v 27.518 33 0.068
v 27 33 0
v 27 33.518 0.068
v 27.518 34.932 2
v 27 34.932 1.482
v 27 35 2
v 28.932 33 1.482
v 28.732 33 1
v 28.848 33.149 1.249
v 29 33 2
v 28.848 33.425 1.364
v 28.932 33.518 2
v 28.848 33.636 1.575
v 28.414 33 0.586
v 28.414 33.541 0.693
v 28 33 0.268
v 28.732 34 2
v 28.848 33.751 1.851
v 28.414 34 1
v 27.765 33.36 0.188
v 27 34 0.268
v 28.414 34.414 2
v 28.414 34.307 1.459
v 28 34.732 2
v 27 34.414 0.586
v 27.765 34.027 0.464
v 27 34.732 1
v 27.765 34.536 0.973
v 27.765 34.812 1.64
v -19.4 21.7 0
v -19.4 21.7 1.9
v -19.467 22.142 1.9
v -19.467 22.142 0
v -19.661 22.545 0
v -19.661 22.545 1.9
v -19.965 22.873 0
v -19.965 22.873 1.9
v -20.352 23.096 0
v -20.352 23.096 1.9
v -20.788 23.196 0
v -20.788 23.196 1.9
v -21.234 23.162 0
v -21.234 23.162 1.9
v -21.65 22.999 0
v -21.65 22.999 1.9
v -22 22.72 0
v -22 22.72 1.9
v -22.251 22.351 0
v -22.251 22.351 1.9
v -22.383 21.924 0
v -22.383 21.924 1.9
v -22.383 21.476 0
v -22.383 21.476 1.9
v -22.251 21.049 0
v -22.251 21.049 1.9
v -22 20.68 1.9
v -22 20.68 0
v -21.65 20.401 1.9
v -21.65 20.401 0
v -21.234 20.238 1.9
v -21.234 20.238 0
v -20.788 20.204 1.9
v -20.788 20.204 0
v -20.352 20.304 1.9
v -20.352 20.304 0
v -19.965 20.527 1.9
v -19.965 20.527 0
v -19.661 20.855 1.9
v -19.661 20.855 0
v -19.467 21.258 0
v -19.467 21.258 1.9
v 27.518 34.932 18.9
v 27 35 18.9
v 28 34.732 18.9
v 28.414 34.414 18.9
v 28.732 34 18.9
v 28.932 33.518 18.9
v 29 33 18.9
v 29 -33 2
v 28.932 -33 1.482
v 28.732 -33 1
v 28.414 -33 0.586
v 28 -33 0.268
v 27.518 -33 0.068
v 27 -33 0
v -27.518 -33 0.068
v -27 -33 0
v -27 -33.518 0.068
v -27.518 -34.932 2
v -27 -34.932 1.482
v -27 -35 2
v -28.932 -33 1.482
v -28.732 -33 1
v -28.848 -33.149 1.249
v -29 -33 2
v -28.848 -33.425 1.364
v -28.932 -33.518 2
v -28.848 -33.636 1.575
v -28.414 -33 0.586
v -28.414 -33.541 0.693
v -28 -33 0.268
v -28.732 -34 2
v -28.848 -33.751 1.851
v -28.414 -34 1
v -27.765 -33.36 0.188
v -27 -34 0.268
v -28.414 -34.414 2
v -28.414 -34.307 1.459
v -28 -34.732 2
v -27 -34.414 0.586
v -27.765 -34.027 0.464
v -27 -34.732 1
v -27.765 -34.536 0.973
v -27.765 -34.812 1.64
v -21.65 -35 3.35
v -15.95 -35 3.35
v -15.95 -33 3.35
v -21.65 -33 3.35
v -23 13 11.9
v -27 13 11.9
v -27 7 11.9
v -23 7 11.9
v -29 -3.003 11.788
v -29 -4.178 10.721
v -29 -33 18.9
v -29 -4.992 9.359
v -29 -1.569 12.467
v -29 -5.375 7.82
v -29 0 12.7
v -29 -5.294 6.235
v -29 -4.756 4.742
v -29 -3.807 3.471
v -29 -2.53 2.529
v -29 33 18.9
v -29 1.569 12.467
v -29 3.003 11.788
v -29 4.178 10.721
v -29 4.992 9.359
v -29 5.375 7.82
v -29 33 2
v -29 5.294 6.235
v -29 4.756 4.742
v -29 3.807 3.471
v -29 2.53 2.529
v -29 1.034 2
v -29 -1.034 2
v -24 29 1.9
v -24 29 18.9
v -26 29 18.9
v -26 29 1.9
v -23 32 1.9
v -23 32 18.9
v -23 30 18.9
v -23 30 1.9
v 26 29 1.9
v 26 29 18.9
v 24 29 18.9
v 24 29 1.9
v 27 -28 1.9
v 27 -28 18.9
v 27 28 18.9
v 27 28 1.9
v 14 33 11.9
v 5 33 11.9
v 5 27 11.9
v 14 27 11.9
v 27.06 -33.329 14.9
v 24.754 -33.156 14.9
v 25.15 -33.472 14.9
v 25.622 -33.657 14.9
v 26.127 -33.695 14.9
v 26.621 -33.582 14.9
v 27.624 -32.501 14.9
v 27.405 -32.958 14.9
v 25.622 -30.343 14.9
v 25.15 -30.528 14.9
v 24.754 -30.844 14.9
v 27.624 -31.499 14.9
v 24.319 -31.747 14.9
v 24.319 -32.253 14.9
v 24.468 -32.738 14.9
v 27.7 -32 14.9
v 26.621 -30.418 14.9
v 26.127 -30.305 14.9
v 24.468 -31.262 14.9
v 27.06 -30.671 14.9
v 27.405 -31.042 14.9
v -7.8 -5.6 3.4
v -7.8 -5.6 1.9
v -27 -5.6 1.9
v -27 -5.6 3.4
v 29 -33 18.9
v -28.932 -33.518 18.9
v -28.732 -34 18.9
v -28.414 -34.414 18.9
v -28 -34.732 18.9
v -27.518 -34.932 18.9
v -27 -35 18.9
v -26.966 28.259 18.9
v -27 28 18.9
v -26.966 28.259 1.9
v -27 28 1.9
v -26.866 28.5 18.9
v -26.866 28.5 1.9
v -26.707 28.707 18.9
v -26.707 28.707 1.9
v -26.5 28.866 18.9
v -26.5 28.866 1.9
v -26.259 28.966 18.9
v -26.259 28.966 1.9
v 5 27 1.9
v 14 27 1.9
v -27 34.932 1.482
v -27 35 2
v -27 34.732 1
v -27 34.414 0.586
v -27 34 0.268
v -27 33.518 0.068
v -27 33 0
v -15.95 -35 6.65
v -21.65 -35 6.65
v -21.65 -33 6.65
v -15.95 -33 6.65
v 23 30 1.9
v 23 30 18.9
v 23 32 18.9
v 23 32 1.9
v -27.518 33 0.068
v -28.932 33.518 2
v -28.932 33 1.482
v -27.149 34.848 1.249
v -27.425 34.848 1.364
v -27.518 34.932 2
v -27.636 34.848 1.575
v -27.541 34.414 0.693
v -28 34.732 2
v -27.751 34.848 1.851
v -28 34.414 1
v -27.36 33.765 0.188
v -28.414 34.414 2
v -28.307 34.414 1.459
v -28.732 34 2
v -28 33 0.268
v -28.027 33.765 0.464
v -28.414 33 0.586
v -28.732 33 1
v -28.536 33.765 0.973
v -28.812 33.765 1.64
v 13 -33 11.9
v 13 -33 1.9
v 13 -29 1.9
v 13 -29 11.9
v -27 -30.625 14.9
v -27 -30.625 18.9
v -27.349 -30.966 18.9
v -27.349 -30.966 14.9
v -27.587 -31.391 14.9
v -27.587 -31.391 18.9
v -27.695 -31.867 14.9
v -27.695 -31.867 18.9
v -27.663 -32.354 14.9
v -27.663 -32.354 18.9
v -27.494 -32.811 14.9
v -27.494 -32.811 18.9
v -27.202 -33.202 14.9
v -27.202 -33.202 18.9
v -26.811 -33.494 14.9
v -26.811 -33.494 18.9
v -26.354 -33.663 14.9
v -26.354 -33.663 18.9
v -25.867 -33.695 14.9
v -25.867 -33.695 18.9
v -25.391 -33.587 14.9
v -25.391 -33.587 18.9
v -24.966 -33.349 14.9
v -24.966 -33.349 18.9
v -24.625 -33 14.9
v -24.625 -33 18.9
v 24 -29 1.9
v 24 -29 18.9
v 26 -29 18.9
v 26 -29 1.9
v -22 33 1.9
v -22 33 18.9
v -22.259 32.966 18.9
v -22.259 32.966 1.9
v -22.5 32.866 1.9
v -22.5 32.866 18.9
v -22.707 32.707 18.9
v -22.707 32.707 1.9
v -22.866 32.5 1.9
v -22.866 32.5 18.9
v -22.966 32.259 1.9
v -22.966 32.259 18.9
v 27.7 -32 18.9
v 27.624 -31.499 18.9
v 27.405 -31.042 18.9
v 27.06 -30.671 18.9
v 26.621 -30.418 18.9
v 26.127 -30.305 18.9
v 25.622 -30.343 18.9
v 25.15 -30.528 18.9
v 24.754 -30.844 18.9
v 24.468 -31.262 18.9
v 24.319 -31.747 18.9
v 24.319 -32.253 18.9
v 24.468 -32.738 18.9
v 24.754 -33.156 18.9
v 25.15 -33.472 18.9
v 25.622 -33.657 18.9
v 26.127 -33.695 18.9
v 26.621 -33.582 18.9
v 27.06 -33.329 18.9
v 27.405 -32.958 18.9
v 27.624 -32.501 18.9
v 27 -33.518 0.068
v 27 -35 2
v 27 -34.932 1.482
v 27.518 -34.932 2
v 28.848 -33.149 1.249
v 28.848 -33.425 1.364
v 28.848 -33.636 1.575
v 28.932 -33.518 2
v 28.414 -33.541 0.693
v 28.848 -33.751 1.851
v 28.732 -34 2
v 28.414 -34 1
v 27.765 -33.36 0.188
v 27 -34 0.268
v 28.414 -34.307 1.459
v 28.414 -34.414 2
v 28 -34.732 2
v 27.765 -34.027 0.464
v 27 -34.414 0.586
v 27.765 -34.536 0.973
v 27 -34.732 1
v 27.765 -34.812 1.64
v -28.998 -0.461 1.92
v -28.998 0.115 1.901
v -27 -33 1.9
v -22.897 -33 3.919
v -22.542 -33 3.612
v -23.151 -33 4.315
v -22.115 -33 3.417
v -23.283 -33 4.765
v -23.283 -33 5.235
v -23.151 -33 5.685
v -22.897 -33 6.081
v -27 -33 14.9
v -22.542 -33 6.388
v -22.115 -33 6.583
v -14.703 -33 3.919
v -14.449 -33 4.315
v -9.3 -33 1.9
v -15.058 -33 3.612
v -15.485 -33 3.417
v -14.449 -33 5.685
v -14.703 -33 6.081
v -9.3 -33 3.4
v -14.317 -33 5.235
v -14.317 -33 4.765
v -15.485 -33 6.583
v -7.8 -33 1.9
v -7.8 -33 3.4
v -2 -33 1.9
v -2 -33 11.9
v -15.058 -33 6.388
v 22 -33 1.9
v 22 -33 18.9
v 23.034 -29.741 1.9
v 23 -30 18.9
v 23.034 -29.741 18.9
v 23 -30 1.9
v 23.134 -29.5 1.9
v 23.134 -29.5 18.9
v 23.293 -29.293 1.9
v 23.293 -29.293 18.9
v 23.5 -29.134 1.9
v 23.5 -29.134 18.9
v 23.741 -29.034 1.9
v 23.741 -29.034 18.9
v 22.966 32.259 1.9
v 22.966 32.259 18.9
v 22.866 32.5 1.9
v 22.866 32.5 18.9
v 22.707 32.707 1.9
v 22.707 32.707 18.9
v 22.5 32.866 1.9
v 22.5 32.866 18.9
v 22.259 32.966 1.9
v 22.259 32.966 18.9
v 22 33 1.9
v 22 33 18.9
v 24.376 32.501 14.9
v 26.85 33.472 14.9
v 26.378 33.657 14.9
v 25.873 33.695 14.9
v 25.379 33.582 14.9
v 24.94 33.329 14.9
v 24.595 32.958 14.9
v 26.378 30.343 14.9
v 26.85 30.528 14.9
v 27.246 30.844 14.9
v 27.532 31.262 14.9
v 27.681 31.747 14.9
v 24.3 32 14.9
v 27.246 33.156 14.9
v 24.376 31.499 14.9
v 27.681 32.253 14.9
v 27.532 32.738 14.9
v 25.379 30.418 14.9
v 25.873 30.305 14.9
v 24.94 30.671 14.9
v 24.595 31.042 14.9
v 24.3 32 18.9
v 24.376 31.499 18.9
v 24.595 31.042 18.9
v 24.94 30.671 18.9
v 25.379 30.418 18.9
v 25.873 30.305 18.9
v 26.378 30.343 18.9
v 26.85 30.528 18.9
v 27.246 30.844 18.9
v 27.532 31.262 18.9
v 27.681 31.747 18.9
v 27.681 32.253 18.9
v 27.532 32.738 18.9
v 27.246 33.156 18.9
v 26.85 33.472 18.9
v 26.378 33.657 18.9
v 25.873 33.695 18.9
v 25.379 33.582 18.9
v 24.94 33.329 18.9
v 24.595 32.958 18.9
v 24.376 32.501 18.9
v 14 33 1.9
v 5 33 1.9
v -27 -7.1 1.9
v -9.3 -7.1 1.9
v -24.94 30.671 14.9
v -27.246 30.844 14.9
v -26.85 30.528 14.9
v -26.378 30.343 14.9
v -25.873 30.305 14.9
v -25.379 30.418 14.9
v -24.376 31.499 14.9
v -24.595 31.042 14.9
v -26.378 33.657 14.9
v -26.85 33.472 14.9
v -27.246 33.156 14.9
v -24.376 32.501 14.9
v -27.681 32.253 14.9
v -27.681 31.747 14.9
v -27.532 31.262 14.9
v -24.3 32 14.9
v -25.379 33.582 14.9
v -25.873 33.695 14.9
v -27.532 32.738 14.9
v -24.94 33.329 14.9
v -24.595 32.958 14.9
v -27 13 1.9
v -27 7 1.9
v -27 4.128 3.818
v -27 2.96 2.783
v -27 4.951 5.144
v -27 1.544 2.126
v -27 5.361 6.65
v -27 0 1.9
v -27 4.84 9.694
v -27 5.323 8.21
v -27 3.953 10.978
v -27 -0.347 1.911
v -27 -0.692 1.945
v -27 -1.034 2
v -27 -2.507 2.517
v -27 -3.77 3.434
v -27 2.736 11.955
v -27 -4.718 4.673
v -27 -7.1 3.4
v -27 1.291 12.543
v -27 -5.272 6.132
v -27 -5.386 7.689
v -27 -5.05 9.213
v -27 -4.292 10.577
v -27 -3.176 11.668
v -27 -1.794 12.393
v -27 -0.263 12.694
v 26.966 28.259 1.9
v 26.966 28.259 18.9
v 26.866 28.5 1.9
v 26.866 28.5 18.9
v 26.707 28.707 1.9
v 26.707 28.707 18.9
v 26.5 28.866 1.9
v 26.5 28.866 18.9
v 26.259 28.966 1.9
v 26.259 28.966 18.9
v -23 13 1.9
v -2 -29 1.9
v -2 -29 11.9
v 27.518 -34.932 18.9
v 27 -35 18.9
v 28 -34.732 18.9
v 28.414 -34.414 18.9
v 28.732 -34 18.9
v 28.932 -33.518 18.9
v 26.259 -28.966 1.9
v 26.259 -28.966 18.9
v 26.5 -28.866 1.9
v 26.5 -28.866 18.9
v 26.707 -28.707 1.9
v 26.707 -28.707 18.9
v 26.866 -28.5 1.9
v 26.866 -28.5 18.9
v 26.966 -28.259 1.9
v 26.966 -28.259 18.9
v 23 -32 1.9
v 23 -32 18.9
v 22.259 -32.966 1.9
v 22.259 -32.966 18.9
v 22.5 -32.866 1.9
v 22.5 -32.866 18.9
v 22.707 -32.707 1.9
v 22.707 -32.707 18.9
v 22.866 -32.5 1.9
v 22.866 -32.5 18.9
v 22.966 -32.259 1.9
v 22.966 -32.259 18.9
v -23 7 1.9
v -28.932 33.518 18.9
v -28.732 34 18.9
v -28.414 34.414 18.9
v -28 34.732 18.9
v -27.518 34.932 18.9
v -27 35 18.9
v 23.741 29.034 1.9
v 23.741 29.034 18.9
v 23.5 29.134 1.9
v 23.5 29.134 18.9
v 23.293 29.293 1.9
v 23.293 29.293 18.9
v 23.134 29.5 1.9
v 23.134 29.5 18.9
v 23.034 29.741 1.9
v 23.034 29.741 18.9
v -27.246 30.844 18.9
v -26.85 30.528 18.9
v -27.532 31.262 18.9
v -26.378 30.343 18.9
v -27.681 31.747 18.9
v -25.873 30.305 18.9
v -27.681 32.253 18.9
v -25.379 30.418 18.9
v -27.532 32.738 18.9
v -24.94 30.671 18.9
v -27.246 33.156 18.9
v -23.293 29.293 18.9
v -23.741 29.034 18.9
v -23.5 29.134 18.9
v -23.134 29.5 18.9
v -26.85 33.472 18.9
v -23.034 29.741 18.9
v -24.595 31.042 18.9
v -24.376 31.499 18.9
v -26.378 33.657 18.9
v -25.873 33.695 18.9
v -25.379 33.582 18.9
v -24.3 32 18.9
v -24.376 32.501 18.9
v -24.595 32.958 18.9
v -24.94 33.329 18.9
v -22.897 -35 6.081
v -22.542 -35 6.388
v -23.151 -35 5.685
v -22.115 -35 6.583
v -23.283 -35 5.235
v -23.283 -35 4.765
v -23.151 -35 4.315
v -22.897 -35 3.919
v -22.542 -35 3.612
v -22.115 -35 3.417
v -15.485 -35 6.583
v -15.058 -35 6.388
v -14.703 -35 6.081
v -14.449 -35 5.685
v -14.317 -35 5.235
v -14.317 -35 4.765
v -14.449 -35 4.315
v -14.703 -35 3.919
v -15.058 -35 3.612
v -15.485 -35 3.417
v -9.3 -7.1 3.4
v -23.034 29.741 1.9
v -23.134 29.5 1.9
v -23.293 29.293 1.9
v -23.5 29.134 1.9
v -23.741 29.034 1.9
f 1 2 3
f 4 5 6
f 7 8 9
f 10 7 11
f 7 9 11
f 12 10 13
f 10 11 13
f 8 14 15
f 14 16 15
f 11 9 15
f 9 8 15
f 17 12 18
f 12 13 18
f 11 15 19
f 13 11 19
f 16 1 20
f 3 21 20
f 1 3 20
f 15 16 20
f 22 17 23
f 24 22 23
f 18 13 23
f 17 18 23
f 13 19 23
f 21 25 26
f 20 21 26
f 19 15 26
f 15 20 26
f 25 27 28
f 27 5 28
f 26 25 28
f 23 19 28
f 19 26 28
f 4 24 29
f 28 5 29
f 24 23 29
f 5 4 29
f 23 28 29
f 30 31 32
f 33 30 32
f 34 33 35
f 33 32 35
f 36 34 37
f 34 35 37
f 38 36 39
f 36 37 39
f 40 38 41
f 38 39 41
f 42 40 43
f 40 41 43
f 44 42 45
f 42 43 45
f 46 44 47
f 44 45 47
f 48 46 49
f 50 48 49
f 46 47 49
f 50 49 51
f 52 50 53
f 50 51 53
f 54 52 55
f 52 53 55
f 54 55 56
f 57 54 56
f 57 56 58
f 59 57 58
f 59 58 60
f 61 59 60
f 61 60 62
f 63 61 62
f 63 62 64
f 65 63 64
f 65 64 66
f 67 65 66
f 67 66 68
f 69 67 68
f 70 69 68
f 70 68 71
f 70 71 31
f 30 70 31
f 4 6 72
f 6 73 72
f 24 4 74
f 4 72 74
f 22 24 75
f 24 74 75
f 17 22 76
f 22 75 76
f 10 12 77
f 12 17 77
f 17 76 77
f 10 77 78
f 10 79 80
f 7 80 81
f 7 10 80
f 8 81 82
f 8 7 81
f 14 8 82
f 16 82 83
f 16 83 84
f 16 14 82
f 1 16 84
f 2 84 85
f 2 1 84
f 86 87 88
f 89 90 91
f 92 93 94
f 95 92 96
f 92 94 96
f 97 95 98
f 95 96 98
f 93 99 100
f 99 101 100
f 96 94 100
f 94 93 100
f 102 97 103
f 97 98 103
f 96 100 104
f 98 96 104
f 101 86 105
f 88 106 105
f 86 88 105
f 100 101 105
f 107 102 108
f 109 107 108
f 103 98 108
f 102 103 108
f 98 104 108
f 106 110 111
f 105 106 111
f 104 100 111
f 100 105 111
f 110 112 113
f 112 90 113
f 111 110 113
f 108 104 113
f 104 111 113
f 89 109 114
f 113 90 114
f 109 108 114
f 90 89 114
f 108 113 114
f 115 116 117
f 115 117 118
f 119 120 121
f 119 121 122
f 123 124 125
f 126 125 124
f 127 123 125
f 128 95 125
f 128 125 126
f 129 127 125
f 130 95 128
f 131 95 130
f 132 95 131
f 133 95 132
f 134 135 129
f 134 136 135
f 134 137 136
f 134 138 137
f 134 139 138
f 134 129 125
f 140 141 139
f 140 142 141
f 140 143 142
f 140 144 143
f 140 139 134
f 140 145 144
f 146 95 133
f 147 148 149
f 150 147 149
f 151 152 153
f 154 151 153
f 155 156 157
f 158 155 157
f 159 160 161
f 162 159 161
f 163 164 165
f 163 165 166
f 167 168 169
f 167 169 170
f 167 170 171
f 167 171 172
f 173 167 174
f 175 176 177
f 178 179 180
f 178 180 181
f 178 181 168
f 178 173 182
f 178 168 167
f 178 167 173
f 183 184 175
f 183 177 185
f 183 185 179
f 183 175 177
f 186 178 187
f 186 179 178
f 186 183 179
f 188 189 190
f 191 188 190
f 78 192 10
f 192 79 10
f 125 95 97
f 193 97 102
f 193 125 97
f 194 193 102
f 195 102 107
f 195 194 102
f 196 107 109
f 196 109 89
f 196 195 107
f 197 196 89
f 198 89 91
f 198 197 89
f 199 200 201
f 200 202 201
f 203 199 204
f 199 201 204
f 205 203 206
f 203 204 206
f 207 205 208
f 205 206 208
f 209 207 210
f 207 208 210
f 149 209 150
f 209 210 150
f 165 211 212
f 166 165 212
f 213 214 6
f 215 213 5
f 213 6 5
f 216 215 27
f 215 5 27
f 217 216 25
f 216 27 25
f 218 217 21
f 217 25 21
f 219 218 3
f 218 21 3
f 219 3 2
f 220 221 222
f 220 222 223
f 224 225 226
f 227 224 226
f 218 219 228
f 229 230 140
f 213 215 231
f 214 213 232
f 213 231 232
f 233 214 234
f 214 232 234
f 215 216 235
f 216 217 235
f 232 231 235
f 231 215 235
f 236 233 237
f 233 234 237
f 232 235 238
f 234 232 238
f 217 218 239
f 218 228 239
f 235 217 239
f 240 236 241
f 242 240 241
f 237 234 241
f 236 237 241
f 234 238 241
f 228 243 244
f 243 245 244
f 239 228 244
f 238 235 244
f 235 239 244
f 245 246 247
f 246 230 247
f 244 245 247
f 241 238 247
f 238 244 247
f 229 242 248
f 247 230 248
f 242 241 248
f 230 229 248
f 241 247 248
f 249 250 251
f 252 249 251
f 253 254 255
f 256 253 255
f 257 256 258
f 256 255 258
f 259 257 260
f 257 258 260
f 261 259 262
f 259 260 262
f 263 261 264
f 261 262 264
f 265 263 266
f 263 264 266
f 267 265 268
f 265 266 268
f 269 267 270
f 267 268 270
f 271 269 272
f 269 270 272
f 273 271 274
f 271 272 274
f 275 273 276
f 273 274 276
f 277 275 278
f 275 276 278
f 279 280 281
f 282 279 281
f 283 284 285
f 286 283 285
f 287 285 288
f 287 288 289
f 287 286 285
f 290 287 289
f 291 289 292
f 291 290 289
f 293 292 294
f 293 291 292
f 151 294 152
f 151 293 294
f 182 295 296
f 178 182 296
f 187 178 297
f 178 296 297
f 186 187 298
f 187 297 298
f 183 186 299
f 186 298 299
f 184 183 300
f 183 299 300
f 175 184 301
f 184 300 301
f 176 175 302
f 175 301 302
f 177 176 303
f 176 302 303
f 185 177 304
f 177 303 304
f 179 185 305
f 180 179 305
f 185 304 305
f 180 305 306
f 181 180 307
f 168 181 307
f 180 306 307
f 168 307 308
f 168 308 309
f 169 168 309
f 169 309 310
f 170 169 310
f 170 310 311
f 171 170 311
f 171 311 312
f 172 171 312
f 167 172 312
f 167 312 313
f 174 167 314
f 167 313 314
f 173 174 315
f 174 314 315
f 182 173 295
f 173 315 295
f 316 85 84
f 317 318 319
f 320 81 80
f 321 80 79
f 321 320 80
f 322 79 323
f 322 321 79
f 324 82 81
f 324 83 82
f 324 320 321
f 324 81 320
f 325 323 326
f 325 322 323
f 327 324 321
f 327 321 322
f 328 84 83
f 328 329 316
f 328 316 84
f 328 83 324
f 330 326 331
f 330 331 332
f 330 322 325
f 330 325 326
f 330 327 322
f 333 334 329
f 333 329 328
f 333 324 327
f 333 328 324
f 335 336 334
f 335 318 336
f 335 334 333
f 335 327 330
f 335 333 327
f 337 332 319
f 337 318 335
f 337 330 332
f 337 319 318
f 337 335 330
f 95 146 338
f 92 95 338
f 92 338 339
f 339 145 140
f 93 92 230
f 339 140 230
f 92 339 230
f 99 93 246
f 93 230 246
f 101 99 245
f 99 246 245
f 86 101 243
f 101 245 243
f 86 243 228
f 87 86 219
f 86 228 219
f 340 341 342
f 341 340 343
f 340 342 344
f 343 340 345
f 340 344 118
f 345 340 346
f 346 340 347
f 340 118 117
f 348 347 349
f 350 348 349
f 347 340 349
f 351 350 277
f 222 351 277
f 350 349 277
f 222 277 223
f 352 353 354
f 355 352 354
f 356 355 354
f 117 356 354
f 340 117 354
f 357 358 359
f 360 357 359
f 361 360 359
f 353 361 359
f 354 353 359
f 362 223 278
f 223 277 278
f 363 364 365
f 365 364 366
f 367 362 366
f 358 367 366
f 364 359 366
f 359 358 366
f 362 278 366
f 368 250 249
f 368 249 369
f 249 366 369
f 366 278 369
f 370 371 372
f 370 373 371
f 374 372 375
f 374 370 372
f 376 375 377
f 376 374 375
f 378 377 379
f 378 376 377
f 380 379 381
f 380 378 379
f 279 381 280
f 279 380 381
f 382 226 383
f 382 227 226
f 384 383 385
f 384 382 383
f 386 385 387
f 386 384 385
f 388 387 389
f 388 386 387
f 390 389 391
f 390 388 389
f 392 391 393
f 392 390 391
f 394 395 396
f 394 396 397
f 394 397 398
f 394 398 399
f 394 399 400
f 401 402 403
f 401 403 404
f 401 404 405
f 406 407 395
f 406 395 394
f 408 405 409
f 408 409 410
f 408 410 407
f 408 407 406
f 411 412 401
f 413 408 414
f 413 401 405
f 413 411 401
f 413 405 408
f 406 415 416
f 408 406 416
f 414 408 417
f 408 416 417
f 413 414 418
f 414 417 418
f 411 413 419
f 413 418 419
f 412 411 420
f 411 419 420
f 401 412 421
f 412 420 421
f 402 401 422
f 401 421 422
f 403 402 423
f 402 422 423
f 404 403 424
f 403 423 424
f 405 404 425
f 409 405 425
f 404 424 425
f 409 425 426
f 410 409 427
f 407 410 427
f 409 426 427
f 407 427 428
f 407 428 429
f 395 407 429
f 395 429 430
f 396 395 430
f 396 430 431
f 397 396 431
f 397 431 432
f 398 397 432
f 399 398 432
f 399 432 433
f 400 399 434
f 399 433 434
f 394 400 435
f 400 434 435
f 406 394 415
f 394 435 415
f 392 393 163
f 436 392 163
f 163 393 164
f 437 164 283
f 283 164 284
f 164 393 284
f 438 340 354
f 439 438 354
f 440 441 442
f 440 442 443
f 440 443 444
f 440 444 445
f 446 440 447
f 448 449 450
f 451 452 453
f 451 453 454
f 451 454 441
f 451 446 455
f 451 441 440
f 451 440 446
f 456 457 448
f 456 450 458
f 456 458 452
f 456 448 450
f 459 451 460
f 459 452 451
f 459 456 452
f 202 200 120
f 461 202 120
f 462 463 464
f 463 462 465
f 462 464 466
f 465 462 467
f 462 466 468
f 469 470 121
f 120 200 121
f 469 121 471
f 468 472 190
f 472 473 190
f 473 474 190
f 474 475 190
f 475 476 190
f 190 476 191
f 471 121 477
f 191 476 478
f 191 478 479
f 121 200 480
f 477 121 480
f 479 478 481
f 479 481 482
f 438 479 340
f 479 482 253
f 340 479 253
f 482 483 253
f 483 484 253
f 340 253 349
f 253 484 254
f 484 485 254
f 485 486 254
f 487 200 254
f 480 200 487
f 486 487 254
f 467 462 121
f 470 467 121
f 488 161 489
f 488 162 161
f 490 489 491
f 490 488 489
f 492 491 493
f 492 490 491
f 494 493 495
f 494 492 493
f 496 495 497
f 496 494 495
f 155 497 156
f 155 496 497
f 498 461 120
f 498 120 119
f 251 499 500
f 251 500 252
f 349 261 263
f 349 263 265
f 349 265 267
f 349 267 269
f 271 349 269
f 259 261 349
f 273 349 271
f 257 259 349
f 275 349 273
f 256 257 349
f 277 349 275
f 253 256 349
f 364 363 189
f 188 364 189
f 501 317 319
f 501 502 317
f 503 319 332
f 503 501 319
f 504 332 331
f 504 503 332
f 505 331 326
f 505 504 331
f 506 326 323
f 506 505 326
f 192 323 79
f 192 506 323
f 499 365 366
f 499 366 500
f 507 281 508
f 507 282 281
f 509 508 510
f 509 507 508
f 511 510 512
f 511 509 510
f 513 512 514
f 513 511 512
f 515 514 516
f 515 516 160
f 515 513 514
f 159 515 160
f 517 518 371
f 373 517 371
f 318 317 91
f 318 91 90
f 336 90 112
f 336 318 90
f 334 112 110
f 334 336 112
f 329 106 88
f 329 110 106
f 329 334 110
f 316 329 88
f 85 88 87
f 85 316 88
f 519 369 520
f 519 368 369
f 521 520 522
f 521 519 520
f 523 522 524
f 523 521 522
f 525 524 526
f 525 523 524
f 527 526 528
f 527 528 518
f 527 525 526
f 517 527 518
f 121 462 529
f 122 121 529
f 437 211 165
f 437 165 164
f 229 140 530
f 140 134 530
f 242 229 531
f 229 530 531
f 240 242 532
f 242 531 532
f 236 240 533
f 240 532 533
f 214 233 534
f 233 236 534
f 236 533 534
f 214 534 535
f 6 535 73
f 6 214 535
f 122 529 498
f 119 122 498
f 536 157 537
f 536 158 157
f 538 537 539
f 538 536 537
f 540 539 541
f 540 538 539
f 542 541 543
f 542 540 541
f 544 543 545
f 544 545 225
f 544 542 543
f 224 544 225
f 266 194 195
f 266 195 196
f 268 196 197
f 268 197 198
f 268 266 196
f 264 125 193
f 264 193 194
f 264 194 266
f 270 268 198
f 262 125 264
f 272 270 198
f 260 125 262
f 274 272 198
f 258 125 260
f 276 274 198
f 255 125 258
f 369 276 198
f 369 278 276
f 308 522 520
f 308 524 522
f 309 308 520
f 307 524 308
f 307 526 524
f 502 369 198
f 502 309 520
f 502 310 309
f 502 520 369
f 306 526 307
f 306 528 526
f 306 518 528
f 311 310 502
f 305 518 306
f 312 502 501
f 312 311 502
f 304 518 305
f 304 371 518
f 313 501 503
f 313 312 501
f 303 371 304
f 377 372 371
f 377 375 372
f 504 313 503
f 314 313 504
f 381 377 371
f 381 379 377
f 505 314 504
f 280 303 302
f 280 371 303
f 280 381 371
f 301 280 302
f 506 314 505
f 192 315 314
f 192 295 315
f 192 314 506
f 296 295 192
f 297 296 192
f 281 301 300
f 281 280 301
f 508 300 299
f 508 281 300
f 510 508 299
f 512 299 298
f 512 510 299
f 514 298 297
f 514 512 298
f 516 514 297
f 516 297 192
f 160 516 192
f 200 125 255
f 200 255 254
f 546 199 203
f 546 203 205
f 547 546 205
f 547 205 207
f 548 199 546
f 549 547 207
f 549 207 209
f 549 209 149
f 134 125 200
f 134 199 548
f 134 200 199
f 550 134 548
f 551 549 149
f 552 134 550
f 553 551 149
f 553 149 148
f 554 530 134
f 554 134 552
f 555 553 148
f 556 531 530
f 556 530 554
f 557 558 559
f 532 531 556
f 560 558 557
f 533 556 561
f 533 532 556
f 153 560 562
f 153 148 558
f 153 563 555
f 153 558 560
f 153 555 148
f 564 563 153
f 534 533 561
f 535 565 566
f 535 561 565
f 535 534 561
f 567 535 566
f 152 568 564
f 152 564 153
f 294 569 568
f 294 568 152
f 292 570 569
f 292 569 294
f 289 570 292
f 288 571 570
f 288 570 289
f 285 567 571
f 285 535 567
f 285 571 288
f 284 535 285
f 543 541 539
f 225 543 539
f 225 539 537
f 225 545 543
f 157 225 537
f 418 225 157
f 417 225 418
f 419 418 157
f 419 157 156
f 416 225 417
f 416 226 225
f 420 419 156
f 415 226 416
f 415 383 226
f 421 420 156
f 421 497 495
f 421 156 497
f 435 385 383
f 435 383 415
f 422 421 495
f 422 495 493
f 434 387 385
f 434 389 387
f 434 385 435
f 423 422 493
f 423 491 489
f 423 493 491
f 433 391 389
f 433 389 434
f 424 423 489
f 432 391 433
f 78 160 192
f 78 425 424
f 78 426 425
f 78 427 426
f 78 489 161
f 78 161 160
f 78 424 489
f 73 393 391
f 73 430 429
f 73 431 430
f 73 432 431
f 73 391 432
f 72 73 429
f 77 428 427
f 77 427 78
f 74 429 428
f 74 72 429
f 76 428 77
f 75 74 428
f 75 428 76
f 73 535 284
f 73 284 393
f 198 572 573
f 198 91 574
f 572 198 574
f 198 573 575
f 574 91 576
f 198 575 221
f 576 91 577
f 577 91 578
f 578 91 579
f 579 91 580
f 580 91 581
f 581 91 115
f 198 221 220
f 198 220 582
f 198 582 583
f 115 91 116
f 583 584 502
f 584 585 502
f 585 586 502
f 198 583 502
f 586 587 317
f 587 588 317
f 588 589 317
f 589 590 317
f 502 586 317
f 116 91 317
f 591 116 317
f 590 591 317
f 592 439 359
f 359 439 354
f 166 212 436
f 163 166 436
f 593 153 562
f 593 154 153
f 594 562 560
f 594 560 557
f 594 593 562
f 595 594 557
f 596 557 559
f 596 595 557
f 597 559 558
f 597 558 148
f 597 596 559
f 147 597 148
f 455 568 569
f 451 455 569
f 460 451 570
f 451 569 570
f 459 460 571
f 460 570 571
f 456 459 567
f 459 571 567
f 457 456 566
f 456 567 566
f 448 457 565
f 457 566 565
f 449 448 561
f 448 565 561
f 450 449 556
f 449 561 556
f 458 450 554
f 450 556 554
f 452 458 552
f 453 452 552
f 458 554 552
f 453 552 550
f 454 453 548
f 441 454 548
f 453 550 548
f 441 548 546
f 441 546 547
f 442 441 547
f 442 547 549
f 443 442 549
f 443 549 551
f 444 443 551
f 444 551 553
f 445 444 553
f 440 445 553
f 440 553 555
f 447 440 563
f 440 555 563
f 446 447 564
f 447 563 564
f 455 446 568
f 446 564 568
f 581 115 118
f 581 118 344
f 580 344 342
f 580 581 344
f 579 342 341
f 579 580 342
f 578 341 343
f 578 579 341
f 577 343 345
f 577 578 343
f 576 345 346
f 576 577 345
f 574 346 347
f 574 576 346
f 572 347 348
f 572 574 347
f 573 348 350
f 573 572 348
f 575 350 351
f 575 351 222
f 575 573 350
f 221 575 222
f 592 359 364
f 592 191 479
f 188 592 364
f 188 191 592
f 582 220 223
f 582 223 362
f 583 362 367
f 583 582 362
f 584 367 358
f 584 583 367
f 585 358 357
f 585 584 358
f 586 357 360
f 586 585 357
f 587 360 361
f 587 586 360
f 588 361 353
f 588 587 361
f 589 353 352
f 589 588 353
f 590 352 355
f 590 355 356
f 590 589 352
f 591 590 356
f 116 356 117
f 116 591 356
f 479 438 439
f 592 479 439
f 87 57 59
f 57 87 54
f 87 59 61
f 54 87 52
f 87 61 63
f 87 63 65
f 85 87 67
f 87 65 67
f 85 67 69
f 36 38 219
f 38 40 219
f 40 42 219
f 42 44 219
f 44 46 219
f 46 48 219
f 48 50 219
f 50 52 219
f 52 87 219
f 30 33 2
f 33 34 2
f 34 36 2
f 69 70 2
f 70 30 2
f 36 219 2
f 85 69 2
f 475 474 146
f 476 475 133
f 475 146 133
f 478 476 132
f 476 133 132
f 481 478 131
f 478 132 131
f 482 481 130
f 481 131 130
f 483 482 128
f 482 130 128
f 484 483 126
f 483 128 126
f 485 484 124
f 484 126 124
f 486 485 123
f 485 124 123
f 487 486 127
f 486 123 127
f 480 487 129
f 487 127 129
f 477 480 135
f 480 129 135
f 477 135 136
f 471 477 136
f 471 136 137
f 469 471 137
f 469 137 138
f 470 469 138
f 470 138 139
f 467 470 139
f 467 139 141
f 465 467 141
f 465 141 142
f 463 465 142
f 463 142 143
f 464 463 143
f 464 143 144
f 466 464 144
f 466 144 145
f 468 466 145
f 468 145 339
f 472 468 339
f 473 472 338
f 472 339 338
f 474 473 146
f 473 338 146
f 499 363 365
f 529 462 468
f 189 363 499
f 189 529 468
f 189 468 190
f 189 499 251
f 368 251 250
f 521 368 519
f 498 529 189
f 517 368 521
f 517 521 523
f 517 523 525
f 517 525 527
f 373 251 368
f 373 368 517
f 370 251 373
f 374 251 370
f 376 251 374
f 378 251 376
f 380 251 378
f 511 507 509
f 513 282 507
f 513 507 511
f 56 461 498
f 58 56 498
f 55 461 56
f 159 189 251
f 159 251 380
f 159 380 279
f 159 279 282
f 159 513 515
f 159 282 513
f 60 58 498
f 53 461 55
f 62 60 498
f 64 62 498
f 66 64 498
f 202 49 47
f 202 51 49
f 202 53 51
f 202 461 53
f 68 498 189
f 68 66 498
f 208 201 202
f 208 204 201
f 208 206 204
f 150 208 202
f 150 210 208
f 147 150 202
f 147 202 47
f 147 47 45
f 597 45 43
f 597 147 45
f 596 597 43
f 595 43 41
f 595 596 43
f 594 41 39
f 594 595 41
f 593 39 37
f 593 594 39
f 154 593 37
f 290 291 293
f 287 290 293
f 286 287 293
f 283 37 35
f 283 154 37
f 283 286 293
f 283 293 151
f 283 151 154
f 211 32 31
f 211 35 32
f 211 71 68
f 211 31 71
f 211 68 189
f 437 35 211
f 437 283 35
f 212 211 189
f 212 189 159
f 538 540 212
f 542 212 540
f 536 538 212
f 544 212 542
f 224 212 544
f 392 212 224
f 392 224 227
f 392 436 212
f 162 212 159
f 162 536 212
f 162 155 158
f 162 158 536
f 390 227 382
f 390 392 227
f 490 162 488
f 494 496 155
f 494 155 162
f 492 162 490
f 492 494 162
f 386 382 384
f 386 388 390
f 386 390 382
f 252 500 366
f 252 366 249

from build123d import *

# Parameters (mm, degrees)
SKETCH_1_W          = 58
SKETCH_1_H          = 70
EXTRUDE_1_DEPTH     = 18.9
CUT_EXTRUDE_1_DEPTH = 17
SKETCH_2_3_R        = 1.7
CUT_EXTRUDE_2_DEPTH = 4
FILLET_1_R          = 1
FILLET_2_R          = 2
SKETCH_4_R          = 1.5
CUT_EXTRUDE_3_DEPTH = 2
SKETCH_4_3_W        = 15
SKETCH_4_3_H        = 4
SKETCH_4_3_W_2      = 4
SKETCH_4_3_H_2      = 6
SKETCH_4_3_W_3      = 9
EXTRUDE_2_DEPTH     = 10
SKETCH_7_R          = 5.4
CUT_EXTRUDE_4_DEPTH = 2
CUT_EXTRUDE_5_DEPTH = 2
EXTRUDE_3_DEPTH     = 1.5


with BuildPart() as part:
    # Эскиз1 → Бобышка-Вытянуть1 (new body)
    with BuildSketch(Plane.XY):
        Rectangle(SKETCH_1_W, SKETCH_1_H)
    extrude(amount=EXTRUDE_1_DEPTH)

    # Эскиз2 → Вырез-Вытянуть1 (cut)
    with BuildSketch(Plane.XY.offset(18.9)):
        Polygon((-27, 29), (-27, -33), (23, -33), (23, -29), (27, -29), (27, 29), (23, 29), (23, 33), (-23, 33), (-23, 29), align=None)
    extrude(amount=-CUT_EXTRUDE_1_DEPTH, mode=Mode.SUBTRACT)

    # Эскиз2<3> → Вырез-Вытянуть2 (cut)
    with BuildSketch(Plane.XY.offset(18.9)):
        with Locations((-26, 32)):
            Circle(SKETCH_2_3_R)
        with Locations((26, 32)):
            Circle(SKETCH_2_3_R)
        with Locations((26, -32)):
            Circle(SKETCH_2_3_R)
        with Locations((-26, -32)):
            Circle(SKETCH_2_3_R)
    extrude(amount=-CUT_EXTRUDE_2_DEPTH, mode=Mode.SUBTRACT)

    # Скругление1
    fillet_1_edges = [part.edges().sort_by_distance(p)[0] for p in [
        (23, -33, 10.4),
        (23, -29, 10.4),
        (27, -29, 10.4),
        (23, 33, 10.4),
        (27, 29, 10.4),
        (-23, 33, 10.4),
        (-27, 29, 10.4),
        (23, 29, 10.4),
        (-23, 29, 10.4),
    ]]
    fillet(fillet_1_edges, radius=FILLET_1_R)

    # Скругление2
    fillet_2_edges = [part.edges().sort_by_distance(p)[0] for p in [
        (0, 35, 0),
        (-29, 0, 0),
        (0, -35, 0),
        (29, 0, 0),
        (29, 35, 9.45),
        (-29, 35, 9.45),
        (-29, -35, 9.45),
        (29, -35, 9.45),
    ]]
    fillet(fillet_2_edges, radius=FILLET_2_R)

    # Эскиз4 → Вырез-Вытянуть3 (cut)
    with BuildSketch(Plane.XY.offset(1.9)):
        with Locations((-20.9, 21.7)):
            Circle(SKETCH_4_R)
    extrude(amount=-CUT_EXTRUDE_3_DEPTH, mode=Mode.SUBTRACT)

    # Эскиз4<3> → Бобышка-Вытянуть2 (add)
    with BuildSketch(Plane.XY.offset(1.9)):
        with Locations((5.5, -31)):
            Rectangle(SKETCH_4_3_W, SKETCH_4_3_H)
        with Locations((-25, 10)):
            Rectangle(SKETCH_4_3_W_2, SKETCH_4_3_H_2)
        with Locations((9.5, 30)):
            Rectangle(SKETCH_4_3_W_3, SKETCH_4_3_H_2)
    extrude(amount=EXTRUDE_2_DEPTH)

    # Эскиз7 → Вырез-Вытянуть4 (cut)
    with BuildSketch(Plane.ZY.offset(29)):
        with Locations((7.3, 0)):
            Circle(SKETCH_7_R)
    extrude(amount=-CUT_EXTRUDE_4_DEPTH, mode=Mode.SUBTRACT)

    # Эскиз8 → Вырез-Вытянуть5 (cut)
    with BuildSketch(Plane.XZ.offset(35)):
        with BuildLine():
            Line((-21.65, 6.65), (-15.95, 6.65))
            ThreePointArc((-15.95, 6.65), (-14.3, 5), (-15.95, 3.35))
            Line((-15.95, 3.35), (-21.65, 3.35))
            ThreePointArc((-21.65, 3.35), (-23.3, 5), (-21.65, 6.65))
        make_face()
    extrude(amount=-CUT_EXTRUDE_5_DEPTH, mode=Mode.SUBTRACT)

    # Эскиз10 → Бобышка-Вытянуть3 (add)
    with BuildSketch(Plane.XY.offset(1.9)):
        Polygon((-9.3, -7.1), (-9.3, -33), (-7.8, -33), (-7.8, -5.6), (-27, -5.6), (-27, -7.1), align=None)
    extrude(amount=EXTRUDE_3_DEPTH)


solid = part.part
